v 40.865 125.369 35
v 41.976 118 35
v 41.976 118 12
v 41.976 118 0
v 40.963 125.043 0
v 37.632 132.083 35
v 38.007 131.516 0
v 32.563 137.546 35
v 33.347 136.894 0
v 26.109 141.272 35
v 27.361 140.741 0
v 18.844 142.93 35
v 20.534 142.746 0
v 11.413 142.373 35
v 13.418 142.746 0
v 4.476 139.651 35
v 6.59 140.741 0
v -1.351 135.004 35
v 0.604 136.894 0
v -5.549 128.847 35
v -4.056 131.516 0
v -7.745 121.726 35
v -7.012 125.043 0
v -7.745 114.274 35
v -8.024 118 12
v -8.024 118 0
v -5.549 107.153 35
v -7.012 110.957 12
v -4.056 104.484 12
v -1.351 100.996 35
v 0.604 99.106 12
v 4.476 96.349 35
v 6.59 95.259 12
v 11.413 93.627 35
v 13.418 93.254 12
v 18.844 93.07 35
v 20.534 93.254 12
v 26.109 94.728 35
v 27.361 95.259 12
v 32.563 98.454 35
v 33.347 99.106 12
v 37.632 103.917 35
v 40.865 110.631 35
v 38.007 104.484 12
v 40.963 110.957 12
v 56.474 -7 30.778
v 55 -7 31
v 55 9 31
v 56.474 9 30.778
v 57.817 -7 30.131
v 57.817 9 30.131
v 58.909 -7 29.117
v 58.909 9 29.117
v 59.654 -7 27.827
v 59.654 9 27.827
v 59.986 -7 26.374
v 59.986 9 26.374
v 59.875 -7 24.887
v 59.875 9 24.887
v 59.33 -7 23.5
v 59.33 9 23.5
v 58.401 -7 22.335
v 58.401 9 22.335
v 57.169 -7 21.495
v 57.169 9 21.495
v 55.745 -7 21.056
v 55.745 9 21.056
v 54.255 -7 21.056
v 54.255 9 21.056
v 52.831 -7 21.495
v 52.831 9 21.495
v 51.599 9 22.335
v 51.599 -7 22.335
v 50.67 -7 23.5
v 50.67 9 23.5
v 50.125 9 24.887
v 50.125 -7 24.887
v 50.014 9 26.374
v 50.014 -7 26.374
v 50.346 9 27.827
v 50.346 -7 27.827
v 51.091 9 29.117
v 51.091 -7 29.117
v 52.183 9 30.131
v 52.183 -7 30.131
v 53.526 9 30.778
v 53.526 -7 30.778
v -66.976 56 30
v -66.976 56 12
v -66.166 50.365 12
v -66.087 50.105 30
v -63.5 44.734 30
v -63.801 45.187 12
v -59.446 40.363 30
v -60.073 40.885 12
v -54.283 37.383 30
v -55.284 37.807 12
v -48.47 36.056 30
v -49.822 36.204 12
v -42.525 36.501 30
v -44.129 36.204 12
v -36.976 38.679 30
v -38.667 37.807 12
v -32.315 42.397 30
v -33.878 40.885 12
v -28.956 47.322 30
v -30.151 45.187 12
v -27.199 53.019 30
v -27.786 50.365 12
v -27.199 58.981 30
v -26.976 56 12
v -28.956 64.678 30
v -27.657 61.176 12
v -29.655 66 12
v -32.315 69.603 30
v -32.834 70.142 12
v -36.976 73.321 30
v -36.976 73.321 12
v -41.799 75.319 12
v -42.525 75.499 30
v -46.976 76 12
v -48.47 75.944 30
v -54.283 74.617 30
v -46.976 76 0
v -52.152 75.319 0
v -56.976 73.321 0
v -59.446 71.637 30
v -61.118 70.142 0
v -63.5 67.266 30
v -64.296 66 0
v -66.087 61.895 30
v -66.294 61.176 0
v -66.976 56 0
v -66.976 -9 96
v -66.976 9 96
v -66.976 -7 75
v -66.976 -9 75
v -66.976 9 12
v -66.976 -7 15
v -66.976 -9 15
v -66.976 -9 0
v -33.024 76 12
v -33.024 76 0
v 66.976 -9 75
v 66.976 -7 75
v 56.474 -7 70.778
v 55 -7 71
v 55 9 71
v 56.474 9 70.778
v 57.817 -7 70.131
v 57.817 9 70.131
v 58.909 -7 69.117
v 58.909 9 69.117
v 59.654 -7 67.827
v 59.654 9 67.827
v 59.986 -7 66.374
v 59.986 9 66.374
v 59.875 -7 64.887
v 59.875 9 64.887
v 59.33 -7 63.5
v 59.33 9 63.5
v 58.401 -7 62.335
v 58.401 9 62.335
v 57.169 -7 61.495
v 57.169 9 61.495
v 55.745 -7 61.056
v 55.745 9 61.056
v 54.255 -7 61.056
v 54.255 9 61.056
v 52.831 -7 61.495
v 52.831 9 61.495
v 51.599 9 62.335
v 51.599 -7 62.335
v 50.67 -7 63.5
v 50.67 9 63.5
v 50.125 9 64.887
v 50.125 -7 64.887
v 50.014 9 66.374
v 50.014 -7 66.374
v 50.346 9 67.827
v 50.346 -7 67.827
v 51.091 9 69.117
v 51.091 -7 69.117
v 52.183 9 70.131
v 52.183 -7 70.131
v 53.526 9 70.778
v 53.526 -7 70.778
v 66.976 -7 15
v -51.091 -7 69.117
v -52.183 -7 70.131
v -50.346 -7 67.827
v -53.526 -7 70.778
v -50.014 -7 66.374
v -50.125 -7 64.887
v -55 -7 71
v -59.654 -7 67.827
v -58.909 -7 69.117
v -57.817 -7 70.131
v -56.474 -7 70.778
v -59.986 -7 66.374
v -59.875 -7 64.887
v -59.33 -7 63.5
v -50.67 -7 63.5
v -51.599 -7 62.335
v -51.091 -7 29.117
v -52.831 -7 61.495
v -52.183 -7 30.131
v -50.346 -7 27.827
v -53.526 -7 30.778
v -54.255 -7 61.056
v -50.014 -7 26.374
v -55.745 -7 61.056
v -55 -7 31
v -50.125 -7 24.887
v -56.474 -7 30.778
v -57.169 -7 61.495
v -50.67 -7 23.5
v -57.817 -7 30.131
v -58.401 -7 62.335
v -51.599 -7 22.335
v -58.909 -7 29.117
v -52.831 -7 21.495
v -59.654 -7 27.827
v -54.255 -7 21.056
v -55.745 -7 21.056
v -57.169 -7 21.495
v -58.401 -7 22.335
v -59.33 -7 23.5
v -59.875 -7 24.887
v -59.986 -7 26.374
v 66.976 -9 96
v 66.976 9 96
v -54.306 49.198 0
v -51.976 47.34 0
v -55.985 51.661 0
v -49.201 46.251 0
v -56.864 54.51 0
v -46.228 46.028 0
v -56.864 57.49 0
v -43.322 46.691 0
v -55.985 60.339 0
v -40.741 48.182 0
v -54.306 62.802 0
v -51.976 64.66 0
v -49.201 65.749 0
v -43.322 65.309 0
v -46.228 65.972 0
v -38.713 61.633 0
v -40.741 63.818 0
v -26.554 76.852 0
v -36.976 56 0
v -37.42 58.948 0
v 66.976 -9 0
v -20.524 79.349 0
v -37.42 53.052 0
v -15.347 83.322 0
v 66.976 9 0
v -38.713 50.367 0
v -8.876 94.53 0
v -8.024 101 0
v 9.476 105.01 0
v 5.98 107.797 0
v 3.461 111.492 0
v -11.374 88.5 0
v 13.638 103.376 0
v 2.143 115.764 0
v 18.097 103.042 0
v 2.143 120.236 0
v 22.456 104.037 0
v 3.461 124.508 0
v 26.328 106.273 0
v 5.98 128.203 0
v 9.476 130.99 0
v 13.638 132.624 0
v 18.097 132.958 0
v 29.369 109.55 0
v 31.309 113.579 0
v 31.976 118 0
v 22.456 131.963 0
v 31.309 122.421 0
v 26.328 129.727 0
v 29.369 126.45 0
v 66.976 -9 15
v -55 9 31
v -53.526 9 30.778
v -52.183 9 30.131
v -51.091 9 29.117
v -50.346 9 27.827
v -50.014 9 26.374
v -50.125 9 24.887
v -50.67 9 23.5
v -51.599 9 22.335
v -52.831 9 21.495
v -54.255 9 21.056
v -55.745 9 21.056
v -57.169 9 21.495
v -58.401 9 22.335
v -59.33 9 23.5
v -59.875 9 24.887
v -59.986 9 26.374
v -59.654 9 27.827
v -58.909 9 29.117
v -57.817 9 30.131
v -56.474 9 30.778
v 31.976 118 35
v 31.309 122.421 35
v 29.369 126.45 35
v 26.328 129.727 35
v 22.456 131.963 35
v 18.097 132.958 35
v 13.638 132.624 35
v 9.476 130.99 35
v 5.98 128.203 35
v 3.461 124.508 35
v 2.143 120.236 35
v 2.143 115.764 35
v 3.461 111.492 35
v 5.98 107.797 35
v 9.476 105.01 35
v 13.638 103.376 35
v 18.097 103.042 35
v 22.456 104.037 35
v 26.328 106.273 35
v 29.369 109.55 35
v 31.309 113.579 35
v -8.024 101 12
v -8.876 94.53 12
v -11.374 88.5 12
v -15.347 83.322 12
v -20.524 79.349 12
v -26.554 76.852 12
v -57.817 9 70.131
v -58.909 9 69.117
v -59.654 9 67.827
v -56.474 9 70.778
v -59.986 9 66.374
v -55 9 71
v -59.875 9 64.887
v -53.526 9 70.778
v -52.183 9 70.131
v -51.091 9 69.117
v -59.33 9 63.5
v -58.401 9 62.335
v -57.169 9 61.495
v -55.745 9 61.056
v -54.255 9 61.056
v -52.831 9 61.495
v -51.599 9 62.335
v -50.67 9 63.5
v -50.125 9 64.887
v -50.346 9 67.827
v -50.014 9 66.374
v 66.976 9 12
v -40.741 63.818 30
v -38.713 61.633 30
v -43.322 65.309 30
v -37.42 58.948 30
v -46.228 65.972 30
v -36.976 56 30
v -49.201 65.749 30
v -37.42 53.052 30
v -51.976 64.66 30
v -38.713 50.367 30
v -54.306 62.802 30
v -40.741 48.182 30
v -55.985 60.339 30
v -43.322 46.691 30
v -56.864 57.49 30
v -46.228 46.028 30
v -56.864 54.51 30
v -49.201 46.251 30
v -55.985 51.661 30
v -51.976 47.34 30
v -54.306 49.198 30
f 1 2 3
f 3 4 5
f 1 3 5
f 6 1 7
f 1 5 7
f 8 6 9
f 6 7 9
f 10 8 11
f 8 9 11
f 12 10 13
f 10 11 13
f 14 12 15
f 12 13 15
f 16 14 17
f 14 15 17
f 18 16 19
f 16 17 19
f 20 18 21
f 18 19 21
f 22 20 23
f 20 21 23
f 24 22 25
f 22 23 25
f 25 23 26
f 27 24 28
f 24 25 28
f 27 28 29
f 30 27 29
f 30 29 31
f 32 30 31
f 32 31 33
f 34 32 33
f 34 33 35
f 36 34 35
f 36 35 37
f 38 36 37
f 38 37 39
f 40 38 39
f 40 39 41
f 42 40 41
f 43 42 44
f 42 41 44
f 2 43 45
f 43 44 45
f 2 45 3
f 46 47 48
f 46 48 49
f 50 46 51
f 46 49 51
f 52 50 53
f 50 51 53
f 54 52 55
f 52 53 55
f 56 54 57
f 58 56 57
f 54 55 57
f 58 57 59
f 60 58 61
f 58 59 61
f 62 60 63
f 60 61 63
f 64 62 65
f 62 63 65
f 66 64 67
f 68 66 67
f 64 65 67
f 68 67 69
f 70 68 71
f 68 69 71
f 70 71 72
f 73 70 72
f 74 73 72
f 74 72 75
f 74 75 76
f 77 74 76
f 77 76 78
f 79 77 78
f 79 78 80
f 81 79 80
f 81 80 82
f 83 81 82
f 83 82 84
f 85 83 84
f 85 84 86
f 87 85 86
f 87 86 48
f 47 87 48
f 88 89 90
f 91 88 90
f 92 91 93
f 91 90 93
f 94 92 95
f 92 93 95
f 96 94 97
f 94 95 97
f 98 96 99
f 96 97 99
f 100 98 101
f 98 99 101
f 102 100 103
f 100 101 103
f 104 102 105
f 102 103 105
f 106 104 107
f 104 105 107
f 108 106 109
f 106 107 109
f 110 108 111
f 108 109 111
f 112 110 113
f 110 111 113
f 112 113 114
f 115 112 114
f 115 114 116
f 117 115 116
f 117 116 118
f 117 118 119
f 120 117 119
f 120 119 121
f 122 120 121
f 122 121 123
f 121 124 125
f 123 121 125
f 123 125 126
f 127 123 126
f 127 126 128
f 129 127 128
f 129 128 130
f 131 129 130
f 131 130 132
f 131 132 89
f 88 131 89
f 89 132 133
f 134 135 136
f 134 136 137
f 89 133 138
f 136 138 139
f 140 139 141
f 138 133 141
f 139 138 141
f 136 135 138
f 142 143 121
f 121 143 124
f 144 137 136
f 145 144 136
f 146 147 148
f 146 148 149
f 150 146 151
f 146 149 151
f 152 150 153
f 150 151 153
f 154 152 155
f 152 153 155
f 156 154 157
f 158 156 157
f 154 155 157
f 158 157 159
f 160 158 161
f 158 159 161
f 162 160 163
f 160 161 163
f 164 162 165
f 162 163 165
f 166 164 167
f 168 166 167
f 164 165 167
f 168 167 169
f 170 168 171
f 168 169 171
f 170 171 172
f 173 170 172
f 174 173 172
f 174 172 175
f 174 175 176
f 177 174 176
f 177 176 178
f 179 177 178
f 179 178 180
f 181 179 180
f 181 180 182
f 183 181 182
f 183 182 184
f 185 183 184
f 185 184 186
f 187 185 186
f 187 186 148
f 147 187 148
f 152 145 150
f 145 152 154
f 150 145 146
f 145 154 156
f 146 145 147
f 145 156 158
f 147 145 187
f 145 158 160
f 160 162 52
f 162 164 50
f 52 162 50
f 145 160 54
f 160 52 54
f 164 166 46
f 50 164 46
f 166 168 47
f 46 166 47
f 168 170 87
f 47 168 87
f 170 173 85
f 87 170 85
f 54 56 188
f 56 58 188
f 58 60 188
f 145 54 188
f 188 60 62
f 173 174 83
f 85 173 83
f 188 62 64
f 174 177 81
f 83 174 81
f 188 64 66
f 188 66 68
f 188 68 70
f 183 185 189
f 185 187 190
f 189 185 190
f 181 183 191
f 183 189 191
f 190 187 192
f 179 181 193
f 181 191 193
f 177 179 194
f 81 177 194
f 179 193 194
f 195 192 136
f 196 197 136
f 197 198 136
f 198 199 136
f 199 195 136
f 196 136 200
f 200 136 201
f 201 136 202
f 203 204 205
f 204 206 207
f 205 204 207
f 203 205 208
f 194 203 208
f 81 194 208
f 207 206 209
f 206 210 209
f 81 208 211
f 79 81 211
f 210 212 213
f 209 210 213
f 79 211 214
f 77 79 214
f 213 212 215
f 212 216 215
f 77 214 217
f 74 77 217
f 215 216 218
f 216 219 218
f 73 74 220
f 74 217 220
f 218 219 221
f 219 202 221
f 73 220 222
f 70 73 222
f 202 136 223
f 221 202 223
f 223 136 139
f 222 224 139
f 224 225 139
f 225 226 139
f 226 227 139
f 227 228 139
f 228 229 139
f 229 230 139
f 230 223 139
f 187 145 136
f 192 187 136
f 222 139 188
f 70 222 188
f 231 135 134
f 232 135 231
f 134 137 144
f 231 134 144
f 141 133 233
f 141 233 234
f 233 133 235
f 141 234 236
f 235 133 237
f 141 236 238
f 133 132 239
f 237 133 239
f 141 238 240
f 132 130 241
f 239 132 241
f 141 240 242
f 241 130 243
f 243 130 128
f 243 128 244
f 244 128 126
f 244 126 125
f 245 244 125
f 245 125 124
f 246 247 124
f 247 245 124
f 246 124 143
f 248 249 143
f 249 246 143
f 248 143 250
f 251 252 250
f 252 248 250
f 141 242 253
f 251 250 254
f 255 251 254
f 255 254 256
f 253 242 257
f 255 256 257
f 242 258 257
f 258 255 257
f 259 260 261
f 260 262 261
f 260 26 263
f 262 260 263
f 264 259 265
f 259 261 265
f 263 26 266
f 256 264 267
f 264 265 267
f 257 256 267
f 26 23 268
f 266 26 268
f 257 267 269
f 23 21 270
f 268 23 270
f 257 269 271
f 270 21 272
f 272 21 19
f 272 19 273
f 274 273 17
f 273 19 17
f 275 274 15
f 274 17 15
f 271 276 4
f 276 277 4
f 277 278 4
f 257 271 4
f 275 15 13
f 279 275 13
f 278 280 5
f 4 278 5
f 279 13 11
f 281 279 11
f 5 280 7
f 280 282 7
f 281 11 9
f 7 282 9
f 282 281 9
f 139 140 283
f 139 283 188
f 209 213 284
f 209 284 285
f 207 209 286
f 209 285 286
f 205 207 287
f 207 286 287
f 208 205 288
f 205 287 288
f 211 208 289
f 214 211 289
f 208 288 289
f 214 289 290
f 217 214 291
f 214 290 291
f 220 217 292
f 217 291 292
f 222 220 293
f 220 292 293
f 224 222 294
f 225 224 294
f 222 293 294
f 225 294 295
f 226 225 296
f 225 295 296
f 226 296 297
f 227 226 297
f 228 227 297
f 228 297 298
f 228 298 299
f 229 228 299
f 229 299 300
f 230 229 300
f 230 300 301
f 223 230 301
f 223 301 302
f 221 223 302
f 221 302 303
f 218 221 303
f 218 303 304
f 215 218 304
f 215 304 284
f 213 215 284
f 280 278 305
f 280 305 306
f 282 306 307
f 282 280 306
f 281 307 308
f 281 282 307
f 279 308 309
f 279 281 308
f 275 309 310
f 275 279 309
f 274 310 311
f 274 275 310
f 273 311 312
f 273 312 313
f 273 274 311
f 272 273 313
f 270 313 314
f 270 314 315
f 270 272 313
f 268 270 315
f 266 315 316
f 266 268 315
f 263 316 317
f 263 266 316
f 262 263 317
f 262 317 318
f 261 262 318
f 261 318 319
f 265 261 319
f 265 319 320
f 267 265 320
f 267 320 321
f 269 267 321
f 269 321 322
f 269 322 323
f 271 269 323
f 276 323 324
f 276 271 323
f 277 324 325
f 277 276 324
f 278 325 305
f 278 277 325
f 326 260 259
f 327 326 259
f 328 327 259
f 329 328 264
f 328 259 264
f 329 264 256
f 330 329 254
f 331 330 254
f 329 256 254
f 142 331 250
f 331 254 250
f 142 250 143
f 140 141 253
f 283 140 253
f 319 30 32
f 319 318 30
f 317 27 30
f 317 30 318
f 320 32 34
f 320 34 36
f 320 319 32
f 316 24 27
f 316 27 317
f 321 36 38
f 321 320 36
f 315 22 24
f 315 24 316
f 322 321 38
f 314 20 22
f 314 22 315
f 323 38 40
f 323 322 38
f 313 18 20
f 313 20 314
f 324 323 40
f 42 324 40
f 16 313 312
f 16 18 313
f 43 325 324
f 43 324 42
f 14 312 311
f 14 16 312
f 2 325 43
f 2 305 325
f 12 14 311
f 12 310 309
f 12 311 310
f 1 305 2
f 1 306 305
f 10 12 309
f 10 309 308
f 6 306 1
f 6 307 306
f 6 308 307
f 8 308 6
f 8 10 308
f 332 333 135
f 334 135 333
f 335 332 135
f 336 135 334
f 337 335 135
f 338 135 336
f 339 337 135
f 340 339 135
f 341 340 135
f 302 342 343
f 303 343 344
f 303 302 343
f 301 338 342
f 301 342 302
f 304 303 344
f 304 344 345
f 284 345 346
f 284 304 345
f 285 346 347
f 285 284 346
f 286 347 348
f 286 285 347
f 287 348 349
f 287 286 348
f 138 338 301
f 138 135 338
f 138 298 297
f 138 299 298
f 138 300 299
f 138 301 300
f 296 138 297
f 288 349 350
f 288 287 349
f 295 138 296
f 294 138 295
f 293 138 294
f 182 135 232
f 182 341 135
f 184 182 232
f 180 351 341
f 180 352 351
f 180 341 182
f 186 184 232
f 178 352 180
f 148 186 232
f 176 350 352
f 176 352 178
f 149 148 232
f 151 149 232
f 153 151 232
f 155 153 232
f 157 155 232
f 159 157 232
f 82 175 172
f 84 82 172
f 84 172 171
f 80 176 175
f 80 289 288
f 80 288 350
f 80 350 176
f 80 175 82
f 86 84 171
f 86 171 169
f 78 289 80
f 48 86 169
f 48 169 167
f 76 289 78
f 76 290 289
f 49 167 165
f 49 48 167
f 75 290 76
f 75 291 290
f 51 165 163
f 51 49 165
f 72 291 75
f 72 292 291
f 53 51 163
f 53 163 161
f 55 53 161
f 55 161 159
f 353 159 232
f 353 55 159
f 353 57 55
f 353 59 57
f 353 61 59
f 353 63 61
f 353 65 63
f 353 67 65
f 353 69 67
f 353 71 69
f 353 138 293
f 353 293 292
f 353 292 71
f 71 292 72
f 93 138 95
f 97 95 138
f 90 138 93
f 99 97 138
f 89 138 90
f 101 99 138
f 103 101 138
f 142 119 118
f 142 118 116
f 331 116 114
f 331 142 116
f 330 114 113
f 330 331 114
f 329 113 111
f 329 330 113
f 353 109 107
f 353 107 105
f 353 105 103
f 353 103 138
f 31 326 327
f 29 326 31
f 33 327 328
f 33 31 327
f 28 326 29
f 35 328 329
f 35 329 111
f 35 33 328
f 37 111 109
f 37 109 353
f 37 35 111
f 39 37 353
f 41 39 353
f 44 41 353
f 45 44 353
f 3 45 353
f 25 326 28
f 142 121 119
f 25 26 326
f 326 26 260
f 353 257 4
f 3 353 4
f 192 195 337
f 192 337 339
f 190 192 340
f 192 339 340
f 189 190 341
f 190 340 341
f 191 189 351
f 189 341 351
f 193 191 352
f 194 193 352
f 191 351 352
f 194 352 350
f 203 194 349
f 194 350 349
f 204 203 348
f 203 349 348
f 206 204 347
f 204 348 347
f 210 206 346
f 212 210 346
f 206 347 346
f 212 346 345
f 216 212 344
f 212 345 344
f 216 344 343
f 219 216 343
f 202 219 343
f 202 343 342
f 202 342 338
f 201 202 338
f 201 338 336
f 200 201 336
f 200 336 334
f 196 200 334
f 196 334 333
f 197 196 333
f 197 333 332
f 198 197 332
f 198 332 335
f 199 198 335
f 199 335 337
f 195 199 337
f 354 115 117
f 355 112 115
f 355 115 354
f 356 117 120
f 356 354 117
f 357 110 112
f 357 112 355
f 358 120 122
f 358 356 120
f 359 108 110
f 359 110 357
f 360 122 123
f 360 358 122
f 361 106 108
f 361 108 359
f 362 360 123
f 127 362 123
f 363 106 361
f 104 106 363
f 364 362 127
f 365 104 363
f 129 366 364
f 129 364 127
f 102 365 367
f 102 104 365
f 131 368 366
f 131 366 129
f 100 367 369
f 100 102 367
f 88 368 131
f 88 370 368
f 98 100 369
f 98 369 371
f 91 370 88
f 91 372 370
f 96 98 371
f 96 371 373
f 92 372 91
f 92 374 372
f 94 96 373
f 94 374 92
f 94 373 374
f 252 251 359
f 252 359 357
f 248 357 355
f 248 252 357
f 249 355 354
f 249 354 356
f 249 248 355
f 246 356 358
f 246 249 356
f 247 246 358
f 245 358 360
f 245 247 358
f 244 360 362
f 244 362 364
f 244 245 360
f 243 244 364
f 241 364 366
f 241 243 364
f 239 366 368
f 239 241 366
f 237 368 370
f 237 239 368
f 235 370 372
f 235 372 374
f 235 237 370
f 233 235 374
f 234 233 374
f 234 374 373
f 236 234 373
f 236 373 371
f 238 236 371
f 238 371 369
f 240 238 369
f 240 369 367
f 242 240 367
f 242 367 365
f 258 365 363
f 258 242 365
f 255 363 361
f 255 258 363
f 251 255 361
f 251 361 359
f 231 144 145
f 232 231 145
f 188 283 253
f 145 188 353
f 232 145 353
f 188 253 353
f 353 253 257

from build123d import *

# Parameters (mm, degrees)
SKETCH1_W               = 133.951426206
SKETCH1_H               = 18
BOSS_EXTRUDE1_DEPTH     = 96
BOSS_EXTRUDE2_DEPTH     = 12
SKETCH1_4_R             = 10
BOSS_EXTRUDE3_DEPTH     = 30
SKETCH1_5_R             = 15
BOSS_EXTRUDE4_DEPTH     = 35
CUT_EXTRUDE1_DEPTH      = 219.192540162
CUT_EXTRUDE1_DEPTH_BACK = 140
SKETCH2_W               = 60
SKETCH2_H               = 2
SKETCH4_R               = 5
CUT_EXTRUDE3_DEPTH      = 35
SKETCH5_R               = 5
CUT_EXTRUDE4_DEPTH      = 35


with BuildPart() as part:
    # Sketch1 → Boss-Extrude1 (new body)
    with BuildSketch(Plane.XY):
        Rectangle(SKETCH1_W, SKETCH1_H)
    extrude(amount=BOSS_EXTRUDE1_DEPTH)

    # Sketch1<3> → Boss-Extrude2 (add)
    with BuildSketch(Plane.XY):
        with BuildLine():
            Line((-66.975713103, 9), (66.975713103, 9))
            Line((66.975713103, 9), (41.975713103, 118))
            ThreePointArc((41.975713103, 118), (16.975713103, 93), (-8.024286897, 118))
            Line((-8.024286897, 118), (-8.024286897, 101))
            ThreePointArc((-8.024286897, 101), (-15.346617368, 83.32233047), (-33.024286897, 76))
            Line((-33.024286897, 76), (-46.975713103, 76))
            ThreePointArc((-46.975713103, 76), (-32.833577479, 70.142135624), (-26.975713103, 56))
            ThreePointArc((-26.975713103, 56), (-46.975713103, 36), (-66.975713103, 56))
            Line((-66.975713103, 56), (-66.975713103, 9))
        make_face()
    extrude(amount=BOSS_EXTRUDE2_DEPTH)

    # Sketch1<4> → Boss-Extrude3 (add)
    with BuildSketch(Plane.XY):
        with BuildLine():
            ThreePointArc((-46.975713103, 76), (-61.117848726, 70.142135624), (-66.975713103, 56))
            ThreePointArc((-66.975713103, 56), (-46.975713103, 36), (-26.975713103, 56))
            ThreePointArc((-26.975713103, 56), (-32.833577479, 70.142135624), (-46.975713103, 76))
        make_face()
        with Locations((-46.975713103, 56)):
            Circle(SKETCH1_4_R, mode=Mode.SUBTRACT)
    extrude(amount=BOSS_EXTRUDE3_DEPTH)

    # Sketch1<5> → Boss-Extrude4 (add)
    with BuildSketch(Plane.XY):
        with BuildLine():
            ThreePointArc((-8.024286897, 118), (16.975713103, 93), (41.975713103, 118))
            ThreePointArc((41.975713103, 118), (16.975713103, 143), (-8.024286897, 118))
        make_face()
        with Locations((16.975713103, 118)):
            Circle(SKETCH1_5_R, mode=Mode.SUBTRACT)
    extrude(amount=BOSS_EXTRUDE4_DEPTH)

    # Sketch2 → Cut-Extrude1 (cut, two sides: drawn at the far end of the back side and taken through both)
    with BuildSketch(Plane(origin=(66.975713103, 0, 0), x_dir=(0, 0, -1), z_dir=(1, 0, 0)).offset(-CUT_EXTRUDE1_DEPTH_BACK)):
        with Locations((-45, -8)):
            Rectangle(SKETCH2_W, SKETCH2_H)
    extrude(amount=CUT_EXTRUDE1_DEPTH + CUT_EXTRUDE1_DEPTH_BACK, mode=Mode.SUBTRACT)

    # Sketch4 → Cut-Extrude3 (cut)
    with BuildSketch(Plane(origin=(0, 9, 0), x_dir=(1, 0, 0), z_dir=(0, 1, 0))):
        with Locations((55, -26)):
            Circle(SKETCH4_R)
        with Locations((55, -66)):
            Circle(SKETCH4_R)
        with Locations((-55, -66)):
            Circle(SKETCH4_R)
    extrude(amount=-CUT_EXTRUDE3_DEPTH, mode=Mode.SUBTRACT)

    # Sketch5 → Cut-Extrude4 (cut)
    with BuildSketch(Plane(origin=(0, 9, 0), x_dir=(1, 0, 0), z_dir=(0, 1, 0))):
        with Locations((-55, -26)):
            Circle(SKETCH5_R)
    extrude(amount=-CUT_EXTRUDE4_DEPTH, mode=Mode.SUBTRACT)


solid = part.part
